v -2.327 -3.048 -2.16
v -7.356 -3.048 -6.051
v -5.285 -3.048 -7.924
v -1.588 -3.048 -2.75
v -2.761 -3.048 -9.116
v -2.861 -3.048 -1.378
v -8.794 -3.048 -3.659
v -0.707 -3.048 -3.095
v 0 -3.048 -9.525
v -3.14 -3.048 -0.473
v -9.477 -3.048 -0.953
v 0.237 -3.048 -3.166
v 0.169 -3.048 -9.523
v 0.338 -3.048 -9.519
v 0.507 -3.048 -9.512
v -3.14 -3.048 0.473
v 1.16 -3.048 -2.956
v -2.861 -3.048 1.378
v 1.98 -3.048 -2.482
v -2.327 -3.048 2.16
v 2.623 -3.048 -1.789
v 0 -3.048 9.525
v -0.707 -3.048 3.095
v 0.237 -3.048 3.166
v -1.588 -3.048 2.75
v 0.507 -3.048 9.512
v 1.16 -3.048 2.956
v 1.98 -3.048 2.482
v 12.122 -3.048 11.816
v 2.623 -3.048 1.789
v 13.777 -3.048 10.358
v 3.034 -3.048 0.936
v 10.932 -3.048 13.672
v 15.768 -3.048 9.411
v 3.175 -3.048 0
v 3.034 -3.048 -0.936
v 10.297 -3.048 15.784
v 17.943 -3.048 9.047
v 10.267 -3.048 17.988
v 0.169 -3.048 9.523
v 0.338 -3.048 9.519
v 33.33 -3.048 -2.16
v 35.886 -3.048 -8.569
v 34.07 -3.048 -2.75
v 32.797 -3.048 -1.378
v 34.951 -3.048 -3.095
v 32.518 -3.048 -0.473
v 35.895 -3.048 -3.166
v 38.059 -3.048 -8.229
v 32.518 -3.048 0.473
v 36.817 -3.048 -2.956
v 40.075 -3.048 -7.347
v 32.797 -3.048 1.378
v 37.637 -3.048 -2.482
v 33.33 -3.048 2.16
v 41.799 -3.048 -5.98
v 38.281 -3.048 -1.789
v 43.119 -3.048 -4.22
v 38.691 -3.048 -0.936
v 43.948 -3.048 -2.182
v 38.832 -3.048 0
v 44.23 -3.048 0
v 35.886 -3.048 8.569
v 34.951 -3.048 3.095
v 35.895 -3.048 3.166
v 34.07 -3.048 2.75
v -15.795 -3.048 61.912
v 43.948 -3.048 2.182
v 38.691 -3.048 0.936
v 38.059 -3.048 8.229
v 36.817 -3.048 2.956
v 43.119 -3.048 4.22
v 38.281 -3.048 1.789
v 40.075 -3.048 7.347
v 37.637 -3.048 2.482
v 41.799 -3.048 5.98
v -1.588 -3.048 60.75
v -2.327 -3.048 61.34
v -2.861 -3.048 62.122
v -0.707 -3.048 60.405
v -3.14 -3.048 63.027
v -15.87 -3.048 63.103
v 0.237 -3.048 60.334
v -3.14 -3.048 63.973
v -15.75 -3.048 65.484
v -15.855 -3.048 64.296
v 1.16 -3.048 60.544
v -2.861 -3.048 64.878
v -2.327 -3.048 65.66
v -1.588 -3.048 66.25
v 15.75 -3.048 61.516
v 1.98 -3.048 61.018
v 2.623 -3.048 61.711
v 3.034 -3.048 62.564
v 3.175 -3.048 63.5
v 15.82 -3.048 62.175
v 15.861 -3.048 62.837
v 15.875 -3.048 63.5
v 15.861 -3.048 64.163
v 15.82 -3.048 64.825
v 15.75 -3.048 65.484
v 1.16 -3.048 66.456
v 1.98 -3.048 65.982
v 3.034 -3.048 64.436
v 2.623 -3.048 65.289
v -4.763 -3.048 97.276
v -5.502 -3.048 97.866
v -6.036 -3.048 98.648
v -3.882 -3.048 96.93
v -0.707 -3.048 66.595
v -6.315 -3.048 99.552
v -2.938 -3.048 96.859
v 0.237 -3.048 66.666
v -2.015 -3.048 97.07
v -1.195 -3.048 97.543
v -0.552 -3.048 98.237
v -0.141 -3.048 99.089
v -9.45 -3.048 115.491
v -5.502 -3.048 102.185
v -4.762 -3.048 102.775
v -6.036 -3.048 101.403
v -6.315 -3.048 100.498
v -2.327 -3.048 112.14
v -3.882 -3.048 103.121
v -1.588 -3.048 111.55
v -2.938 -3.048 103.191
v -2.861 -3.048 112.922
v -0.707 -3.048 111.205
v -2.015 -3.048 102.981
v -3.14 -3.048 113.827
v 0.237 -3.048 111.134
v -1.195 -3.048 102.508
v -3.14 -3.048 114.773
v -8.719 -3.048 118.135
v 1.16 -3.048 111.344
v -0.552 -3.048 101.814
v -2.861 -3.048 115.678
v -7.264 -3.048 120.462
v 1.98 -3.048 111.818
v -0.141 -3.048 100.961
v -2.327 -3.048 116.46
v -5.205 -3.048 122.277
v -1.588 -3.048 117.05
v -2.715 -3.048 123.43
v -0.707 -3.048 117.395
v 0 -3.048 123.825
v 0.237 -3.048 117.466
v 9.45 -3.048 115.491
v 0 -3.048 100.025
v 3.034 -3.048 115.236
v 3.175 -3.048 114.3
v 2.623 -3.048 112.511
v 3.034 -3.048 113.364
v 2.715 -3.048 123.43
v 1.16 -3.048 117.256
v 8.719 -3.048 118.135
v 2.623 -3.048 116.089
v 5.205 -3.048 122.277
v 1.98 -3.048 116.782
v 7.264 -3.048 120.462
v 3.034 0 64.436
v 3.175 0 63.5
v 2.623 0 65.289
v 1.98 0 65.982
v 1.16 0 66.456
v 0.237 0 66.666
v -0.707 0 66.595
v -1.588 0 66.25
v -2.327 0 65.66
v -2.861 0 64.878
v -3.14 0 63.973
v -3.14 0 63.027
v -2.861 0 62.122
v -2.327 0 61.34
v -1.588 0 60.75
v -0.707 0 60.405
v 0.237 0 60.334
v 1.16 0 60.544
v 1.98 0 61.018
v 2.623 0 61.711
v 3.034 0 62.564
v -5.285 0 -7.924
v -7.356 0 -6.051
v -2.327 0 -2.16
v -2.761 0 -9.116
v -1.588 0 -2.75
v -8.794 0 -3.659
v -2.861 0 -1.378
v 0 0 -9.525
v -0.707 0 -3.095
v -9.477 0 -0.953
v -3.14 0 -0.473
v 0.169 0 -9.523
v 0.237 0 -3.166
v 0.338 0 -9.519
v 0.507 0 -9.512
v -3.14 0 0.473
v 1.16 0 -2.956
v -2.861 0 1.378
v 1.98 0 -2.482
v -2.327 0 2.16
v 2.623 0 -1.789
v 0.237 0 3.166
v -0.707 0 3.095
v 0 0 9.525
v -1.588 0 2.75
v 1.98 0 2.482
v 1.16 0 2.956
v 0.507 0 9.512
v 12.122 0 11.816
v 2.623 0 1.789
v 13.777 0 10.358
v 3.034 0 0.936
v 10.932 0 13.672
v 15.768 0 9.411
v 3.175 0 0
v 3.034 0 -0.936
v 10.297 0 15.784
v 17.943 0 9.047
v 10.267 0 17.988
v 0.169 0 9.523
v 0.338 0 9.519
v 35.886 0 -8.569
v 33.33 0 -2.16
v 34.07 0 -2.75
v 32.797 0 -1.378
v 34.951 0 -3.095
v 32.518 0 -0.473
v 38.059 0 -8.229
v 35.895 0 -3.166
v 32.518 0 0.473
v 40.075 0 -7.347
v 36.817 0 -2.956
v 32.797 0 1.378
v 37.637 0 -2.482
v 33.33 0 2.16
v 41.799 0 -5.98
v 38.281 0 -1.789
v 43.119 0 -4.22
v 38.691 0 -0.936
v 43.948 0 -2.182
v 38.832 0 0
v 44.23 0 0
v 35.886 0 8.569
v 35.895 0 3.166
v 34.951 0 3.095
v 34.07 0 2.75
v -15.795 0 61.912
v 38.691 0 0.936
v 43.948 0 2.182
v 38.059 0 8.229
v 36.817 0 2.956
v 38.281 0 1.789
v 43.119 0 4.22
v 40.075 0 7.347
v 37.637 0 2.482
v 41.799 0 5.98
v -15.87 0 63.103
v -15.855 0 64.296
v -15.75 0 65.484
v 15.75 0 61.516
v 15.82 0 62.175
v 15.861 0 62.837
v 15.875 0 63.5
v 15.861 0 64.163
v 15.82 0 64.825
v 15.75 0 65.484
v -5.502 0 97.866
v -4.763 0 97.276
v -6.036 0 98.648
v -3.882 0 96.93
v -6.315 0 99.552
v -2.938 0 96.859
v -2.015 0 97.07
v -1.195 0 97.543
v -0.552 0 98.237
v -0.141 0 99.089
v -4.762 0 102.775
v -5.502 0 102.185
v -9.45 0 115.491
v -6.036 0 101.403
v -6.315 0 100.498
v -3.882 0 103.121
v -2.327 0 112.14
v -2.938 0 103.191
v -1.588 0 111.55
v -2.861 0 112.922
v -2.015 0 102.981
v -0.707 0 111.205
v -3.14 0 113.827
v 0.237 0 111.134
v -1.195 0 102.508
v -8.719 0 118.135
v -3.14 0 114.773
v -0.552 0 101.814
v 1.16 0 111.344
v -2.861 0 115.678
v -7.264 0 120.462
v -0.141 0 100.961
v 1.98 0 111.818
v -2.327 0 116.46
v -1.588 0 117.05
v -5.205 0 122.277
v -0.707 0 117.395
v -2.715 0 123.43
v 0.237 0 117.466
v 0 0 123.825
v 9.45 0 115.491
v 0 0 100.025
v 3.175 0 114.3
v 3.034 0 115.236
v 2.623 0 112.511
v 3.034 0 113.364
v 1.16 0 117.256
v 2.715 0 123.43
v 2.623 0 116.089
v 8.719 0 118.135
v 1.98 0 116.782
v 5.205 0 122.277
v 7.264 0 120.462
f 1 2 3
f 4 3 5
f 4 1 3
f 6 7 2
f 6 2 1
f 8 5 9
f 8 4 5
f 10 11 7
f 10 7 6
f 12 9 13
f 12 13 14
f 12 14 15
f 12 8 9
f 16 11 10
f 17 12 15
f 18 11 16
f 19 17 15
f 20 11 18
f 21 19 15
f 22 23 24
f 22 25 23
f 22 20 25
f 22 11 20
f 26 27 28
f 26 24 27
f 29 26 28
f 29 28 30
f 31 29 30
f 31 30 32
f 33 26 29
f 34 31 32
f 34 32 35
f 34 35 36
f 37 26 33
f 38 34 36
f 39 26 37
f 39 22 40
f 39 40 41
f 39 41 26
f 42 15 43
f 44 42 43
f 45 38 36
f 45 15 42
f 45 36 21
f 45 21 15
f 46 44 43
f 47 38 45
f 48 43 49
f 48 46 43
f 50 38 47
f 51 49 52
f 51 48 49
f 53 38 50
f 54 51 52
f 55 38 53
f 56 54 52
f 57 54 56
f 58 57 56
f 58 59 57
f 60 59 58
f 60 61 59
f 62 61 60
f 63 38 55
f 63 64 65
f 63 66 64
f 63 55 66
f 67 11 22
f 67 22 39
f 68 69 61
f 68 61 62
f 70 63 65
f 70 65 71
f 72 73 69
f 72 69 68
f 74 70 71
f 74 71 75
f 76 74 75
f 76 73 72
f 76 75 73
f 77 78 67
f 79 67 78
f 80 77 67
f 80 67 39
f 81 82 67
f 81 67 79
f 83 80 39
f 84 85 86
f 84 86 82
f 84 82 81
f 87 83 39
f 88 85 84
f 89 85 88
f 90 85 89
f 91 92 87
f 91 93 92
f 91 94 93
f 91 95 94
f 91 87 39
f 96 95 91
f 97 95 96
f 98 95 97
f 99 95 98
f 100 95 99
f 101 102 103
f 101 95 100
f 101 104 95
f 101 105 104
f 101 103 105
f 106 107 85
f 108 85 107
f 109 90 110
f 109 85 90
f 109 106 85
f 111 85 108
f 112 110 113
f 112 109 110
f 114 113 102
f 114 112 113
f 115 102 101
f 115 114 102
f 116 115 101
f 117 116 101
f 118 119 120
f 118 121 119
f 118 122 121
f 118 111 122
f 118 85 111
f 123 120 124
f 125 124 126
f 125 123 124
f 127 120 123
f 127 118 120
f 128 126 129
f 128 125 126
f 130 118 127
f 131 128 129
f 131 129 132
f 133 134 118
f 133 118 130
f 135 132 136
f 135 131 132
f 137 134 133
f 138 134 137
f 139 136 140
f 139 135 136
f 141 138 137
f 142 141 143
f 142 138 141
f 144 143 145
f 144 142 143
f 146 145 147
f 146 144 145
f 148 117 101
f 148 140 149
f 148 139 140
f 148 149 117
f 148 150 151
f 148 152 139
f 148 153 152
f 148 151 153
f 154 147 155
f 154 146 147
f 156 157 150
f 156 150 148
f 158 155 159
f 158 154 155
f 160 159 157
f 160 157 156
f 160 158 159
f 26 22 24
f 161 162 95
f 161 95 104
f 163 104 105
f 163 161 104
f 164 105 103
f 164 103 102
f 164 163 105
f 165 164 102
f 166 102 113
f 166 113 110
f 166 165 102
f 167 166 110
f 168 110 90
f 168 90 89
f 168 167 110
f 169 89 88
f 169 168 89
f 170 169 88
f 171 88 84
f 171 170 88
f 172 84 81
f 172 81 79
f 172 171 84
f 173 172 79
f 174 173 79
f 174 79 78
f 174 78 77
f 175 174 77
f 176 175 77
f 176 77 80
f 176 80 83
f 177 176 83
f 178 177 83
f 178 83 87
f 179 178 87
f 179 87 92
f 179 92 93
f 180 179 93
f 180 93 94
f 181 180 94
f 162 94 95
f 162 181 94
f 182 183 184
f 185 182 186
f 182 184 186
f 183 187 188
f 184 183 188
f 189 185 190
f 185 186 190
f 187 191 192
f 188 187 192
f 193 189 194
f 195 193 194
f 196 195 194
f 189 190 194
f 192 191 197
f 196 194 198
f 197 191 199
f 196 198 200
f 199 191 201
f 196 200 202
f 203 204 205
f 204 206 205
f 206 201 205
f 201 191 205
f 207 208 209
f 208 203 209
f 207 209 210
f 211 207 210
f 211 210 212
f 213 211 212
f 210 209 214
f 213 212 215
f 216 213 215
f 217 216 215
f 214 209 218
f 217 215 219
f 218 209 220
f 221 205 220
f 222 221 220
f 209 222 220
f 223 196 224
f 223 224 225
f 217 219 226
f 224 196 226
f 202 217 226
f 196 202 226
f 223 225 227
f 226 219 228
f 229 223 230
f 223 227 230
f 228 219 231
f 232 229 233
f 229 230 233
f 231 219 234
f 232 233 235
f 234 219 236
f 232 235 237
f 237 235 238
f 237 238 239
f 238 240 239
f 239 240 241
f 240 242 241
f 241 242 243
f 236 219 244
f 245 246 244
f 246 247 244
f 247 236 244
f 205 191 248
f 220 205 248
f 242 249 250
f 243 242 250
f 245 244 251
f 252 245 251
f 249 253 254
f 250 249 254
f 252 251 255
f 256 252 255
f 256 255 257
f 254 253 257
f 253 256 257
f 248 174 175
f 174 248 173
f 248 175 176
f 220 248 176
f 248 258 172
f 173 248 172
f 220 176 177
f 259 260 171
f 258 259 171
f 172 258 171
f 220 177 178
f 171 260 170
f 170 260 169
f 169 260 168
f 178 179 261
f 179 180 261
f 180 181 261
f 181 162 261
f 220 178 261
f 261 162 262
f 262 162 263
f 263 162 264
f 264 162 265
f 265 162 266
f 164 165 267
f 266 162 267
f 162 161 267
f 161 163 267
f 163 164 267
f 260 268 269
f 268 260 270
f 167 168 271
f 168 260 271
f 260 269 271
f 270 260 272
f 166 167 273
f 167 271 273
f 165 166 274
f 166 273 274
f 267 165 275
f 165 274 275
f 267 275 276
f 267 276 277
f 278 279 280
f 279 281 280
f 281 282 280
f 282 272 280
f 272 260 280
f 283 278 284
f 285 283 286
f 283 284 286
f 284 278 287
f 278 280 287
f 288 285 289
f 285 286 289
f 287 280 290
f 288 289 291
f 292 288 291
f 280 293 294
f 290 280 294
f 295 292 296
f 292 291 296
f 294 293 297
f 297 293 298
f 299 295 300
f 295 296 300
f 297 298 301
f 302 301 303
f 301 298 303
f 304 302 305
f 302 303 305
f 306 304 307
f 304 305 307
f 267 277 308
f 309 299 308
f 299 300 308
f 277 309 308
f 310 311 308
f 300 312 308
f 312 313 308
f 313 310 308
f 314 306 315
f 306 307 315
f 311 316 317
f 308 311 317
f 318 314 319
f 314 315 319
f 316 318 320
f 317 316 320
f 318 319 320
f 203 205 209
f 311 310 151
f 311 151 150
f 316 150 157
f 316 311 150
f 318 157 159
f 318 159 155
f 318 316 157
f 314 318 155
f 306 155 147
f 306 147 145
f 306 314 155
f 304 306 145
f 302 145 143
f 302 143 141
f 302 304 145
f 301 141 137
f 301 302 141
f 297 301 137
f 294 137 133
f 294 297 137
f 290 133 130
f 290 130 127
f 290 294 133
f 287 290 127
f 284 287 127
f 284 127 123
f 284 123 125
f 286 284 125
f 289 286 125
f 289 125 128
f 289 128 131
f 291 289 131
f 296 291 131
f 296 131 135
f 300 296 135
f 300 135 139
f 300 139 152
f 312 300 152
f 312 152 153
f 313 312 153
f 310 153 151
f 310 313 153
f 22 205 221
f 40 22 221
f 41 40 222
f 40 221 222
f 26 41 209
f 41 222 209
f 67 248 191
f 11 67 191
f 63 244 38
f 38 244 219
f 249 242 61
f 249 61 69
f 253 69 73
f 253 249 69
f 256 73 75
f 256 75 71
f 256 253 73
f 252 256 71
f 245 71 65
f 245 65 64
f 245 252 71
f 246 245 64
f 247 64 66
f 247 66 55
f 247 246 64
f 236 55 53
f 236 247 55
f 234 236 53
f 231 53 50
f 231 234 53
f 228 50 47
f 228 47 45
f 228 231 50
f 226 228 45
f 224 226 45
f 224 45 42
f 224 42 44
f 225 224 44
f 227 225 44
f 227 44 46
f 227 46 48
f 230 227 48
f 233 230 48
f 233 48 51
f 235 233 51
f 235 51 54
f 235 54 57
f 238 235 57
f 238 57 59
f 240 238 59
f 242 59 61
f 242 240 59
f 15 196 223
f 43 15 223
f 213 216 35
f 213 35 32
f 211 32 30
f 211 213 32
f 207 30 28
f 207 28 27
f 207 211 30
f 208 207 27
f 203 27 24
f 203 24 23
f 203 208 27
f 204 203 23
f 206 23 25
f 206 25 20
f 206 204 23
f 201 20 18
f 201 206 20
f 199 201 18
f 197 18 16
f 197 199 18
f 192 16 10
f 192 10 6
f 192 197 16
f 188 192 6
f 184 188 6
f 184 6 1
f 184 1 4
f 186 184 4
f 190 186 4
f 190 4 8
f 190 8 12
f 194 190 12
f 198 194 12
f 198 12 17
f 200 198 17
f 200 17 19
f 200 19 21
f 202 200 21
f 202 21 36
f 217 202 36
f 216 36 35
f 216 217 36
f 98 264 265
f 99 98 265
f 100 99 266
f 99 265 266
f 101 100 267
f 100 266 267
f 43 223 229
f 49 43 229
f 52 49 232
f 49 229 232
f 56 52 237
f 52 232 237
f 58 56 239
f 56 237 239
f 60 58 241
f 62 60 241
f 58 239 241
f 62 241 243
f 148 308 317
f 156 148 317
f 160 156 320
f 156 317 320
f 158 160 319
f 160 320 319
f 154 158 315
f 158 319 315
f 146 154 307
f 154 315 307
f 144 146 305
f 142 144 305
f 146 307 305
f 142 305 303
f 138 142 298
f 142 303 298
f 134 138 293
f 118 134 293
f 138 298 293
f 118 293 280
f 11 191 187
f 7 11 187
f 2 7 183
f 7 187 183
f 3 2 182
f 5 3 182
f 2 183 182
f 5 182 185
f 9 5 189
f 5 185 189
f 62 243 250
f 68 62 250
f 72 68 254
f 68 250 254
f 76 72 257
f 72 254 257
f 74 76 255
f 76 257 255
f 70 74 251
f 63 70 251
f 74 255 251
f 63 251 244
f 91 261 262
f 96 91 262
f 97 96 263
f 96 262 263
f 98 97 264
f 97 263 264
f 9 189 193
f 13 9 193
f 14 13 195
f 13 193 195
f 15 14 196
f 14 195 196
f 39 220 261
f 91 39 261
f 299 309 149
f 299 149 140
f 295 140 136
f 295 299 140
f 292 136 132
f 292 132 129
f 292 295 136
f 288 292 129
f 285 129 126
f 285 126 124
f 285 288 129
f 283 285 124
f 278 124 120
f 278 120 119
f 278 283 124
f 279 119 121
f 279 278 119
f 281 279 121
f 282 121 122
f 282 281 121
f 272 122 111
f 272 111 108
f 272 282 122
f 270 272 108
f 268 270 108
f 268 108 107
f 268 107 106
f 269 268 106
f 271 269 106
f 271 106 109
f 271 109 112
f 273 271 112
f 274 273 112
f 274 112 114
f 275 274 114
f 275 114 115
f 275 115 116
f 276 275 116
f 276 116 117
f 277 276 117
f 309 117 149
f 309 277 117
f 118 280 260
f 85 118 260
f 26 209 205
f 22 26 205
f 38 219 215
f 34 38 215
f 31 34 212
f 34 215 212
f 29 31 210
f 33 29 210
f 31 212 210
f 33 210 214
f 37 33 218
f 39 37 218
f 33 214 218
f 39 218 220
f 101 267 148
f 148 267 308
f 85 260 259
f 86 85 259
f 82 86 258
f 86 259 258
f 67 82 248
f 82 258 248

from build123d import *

# Parameters (mm, degrees)
F0_R     = 3.175
F1_DEPTH = 3.048


with BuildPart() as f1:
    # F0 (on Front) → F1 (new body)
    with BuildSketch(Plane.XZ):
        with BuildLine():
            ThreePointArc((-9.450293, 115.490625), (-0.596483, 104.793695), (9.525, 114.3))
            ThreePointArc((9.525, 114.3), (9.506305, 114.896483), (9.450293, 115.490625))
            ThreePointArc((9.450293, 115.490625), (0, 123.825), (-9.450293, 115.490625))
        make_face()
        with Locations((0, 114.3)):
            Circle(F0_R, mode=Mode.SUBTRACT)
        with BuildLine():
            ThreePointArc((9.450293, 115.490625), (9.506305, 114.896483), (9.525, 114.3))
            ThreePointArc((9.525, 114.3), (-0.596483, 104.793695), (-9.450293, 115.490625))
            Line((-9.450293, 115.490625), (-15.750488, 65.484375))
            ThreePointArc((-15.750488, 65.484375), (0, 79.375), (15.750488, 65.484375))
            Line((15.750488, 65.484375), (9.450293, 115.490625))
        make_face()
        with Locations((-3.175, 100.0252)):
            Circle(F0_R, mode=Mode.SUBTRACT)
        with BuildLine():
            ThreePointArc((15.875, 63.5), (15.843841, 64.494139), (15.750488, 65.484375))
            ThreePointArc((15.750488, 65.484375), (0, 79.375), (-15.750488, 65.484375))
            ThreePointArc((-15.750488, 65.484375), (-15.873744, 63.699705), (-15.795426, 61.9125))
            ThreePointArc((-15.795426, 61.9125), (-0.199705, 47.626256), (15.750488, 61.515625))
            ThreePointArc((15.750488, 61.515625), (15.843841, 62.505861), (15.875, 63.5))
        make_face()
        with Locations((0, 63.5)):
            Circle(F0_R, mode=Mode.SUBTRACT)
        with BuildLine():
            ThreePointArc((15.750488, 61.515625), (-0.199705, 47.626256), (-15.795426, 61.9125))
            Line((-15.795426, 61.9125), (-9.477255, -0.9525))
            ThreePointArc((-9.477255, -0.9525), (-7.063929, 6.389564), (0, 9.525))
            ThreePointArc((0, 9.525), (0.253535, 9.521625), (0.506891, 9.511503))
            ThreePointArc((0.506891, 9.511503), (6.912082, 6.553529), (9.525, 0))
            ThreePointArc((9.525, 0), (6.912082, -6.553529), (0.506891, -9.511503))
            Line((0.506891, -9.511503), (35.885598, -8.569463))
            ThreePointArc((35.885598, -8.569463), (27.084916, 0), (35.885598, 8.569463))
            Line((35.885598, 8.569463), (17.942799, 9.047231))
            ThreePointArc((17.942799, 9.047231), (12.122303, 11.815881), (10.266572, 17.988389))
            Line((10.266572, 17.988389), (15.750488, 61.515625))
        make_face()
        with BuildLine():
            ThreePointArc((0, 9.525), (-7.063929, 6.389564), (-9.477255, -0.9525))
            ThreePointArc((-9.477255, -0.9525), (-6.389564, -7.063929), (0, -9.525))
            Line((0, -9.525), (0.506891, -9.511503))
            ThreePointArc((0.506891, -9.511503), (6.912082, -6.553529), (9.525, 0))
            ThreePointArc((9.525, 0), (6.912082, 6.553529), (0.506891, 9.511503))
            Line((0.506891, 9.511503), (0, 9.525))
        make_face()
        Circle(F0_R, mode=Mode.SUBTRACT)
        with BuildLine():
            Line((0.506891, -9.511503), (0, -9.525))
            ThreePointArc((0, -9.525), (0.253535, -9.521625), (0.506891, -9.511503))
        make_face()
        with BuildLine():
            ThreePointArc((44.229916, 0), (41.799234, 5.980454), (35.885598, 8.569463))
            ThreePointArc((35.885598, 8.569463), (27.084916, 0), (35.885598, -8.569463))
            ThreePointArc((35.885598, -8.569463), (41.799234, -5.980454), (44.229916, 0))
        make_face()
        with Locations((35.657416, 0)):
            Circle(F0_R, mode=Mode.SUBTRACT)
    extrude(amount=F1_DEPTH)


solid = f1.part
